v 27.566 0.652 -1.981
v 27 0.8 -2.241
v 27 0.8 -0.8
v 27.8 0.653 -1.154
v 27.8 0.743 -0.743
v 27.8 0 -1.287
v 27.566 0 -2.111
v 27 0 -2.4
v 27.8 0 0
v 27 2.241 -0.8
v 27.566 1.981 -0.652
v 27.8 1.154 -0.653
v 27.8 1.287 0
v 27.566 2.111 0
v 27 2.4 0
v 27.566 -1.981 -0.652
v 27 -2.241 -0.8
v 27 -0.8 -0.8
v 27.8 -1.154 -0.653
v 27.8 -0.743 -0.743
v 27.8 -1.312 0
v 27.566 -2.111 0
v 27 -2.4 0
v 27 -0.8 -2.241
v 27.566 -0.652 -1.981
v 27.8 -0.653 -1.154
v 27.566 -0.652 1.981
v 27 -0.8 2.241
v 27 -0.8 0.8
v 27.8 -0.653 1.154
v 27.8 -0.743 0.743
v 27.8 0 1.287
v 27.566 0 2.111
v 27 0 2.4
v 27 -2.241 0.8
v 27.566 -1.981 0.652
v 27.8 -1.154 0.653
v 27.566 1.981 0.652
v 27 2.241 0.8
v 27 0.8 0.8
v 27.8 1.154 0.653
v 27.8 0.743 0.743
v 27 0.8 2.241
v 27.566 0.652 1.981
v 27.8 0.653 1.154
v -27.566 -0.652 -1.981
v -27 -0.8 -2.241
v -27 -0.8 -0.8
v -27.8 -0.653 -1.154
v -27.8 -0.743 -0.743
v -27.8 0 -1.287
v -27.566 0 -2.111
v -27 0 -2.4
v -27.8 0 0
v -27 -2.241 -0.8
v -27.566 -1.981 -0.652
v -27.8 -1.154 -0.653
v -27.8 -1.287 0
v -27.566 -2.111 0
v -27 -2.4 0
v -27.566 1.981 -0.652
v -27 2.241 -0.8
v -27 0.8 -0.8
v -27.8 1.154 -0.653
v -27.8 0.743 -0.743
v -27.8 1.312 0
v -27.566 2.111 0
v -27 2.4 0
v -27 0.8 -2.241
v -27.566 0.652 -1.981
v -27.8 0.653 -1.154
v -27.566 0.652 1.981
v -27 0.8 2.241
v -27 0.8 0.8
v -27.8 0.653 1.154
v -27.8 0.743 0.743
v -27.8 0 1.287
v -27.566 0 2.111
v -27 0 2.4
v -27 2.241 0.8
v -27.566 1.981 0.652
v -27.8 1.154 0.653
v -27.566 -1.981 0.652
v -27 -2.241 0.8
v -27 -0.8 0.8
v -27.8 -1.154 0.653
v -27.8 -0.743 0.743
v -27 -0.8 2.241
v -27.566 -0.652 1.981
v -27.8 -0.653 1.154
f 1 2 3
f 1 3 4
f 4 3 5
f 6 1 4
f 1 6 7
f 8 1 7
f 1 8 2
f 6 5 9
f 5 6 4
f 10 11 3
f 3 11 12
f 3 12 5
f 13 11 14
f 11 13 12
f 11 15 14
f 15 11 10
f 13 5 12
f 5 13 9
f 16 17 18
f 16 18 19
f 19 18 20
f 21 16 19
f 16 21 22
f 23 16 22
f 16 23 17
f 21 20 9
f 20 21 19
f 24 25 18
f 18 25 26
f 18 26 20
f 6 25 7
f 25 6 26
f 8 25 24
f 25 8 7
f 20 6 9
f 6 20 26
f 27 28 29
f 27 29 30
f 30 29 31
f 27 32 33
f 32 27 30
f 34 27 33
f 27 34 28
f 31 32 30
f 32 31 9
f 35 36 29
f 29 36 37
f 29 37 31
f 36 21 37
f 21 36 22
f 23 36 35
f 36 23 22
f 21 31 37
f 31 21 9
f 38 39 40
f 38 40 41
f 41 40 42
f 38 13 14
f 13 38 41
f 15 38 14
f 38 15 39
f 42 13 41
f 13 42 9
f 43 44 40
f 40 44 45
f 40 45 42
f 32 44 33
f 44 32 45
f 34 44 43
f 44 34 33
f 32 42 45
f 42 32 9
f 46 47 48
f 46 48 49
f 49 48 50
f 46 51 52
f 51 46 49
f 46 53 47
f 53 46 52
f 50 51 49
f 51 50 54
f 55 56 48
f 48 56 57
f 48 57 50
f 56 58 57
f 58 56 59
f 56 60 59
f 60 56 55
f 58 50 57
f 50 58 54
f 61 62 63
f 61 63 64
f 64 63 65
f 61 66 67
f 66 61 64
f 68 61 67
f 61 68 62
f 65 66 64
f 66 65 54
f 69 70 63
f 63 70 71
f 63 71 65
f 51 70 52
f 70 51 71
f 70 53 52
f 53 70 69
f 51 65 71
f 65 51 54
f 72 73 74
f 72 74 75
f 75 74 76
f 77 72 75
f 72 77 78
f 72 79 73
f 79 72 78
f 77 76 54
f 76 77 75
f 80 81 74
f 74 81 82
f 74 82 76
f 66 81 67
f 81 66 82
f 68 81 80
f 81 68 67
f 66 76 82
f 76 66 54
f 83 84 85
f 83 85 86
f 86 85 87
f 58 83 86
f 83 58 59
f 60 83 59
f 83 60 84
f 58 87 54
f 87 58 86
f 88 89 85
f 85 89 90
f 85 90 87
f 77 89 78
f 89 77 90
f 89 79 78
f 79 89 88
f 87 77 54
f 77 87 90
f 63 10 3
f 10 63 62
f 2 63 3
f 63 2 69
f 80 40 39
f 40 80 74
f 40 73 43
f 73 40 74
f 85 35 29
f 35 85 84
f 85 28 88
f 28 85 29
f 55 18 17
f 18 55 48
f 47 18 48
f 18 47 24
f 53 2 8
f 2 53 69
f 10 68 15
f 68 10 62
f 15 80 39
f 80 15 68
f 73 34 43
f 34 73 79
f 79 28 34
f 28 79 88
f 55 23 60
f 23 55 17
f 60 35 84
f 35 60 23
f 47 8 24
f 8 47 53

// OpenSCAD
// file: ../p/box2-9p.scad
use <../lib.scad>
function ldraw_lib__box2_9p() = [
// 0 Box with  2 Faces with  3 Parallel Edges
// 0 Name: box2-9p.dat
// 0 Author: Willy Tschager [Holly-Wood]
// 0 !LDRAW_ORG Primitive UPDATE 2024-01
// 0 !LICENSE Licensed under CC BY 4.0 : see CAreadme.txt
// 
// 0 BFC CERTIFY CCW
  [0,"BFC","CERTIFY"],
  [0,"BFC","CCW"],
// 
// 0 !HISTORY 2013-12-23 [PTadmin] Official Update 2013-02
// 0 !HISTORY 2024-01-04 [Holly-Wood] Complete re-write, original by Duq
// 0 !HISTORY 2024-01-29 [OrionP] Official Update 2024-01
// 
// 2 24 -1 1 1 1 1 1
  [2,24,-1,1,1,1,1,1],
// 2 24 -1 1 -1 1 1 -1
  [2,24,-1,1,-1,1,1,-1],
// 4 16 -1 1 1 1 1 1 1 1 -1 -1 1 -1
  [4,16,-1,1,1,1,1,1,1,1,-1,-1,1,-1],
// 
// 2 24 -1 -1 1 1 -1 1
  [2,24,-1,-1,1,1,-1,1],
// 4 16 1 -1 1 1 1 1 -1 1 1 -1 -1 1
  [4,16,1,-1,1,1,1,1,-1,1,1,-1,-1,1],
];
module ldraw_lib__box2_9p(step=0, col=false, unit=2/5, alt=false, line=0.2, solid=!$preview)
    makepoly(ldraw_lib__box2_9p(), step=step, col=col, unit=unit, alt=alt, line=line, solid=solid);
ldraw_lib__box2_9p(line=0.2);
// file: ../p/axlehol8.scad
use <../lib.scad>
use <box2-9p.scad>
function ldraw_lib__axlehol8() = [
// 0 Technic Axle Perimeter
// 0 Name: axlehol8.dat
// 0 Author: Steve Bliss [sbliss]
// 0 !LDRAW_ORG Primitive UPDATE 2024-01
// 0 !LICENSE Licensed under CC BY 4.0 : see CAreadme.txt
// 
// 0 BFC CERTIFY CCW
  [0,"BFC","CERTIFY"],
  [0,"BFC","CCW"],
// 
// 0 !HISTORY 2000-05-07 [PTadmin] Official Update 2000-01
// 0 !HISTORY 2002-11-08 [OrionP] Adjusted fit and precision
// 0 !HISTORY 2003-03-12 [PTadmin] Official Update 2003-01
// 0 !HISTORY 2007-06-24 [PTadmin] Header formatted for Contributor Agreement
// 0 !HISTORY 2008-07-01 [PTadmin] Official Update 2008-01
// 0 !HISTORY 2021-03-25 [Sirio] Rounded to four decimals and added primitives
// 0 !HISTORY 2022-03-06 [PTadmin] Official Update 2022-02
// 0 !HISTORY 2024-01-24 [MagFors] Update description, to be only used on axles, not holes
// 0 !HISTORY 2024-01-29 [OrionP] Official Update 2024-01
// 
// 0 // Primitives
// 0 BFC INVERTNEXT
  [0,"BFC","INVERTNEXT"],
// 1 16 3.80115 .5 3.80115 0 -1.80115 0 .5 0 0 0 0 -1.80115 box2-9p.dat
  [1,16,3.80115,.5,3.80115,0,-1.80115,0,.5,0,0,0,0,-1.80115, ldraw_lib__box2_9p()],
// 0 BFC INVERTNEXT
  [0,"BFC","INVERTNEXT"],
// 1 16 -3.80115 .5 3.80115 0 1.80115 0 .5 0 0 0 0 -1.80115 box2-9p.dat
  [1,16,-3.80115,.5,3.80115,0,1.80115,0,.5,0,0,0,0,-1.80115, ldraw_lib__box2_9p()],
// 0 BFC INVERTNEXT
  [0,"BFC","INVERTNEXT"],
// 1 16 -3.80115 .5 -3.80115 0 1.80115 0 .5 0 0 0 0 1.80115 box2-9p.dat
  [1,16,-3.80115,.5,-3.80115,0,1.80115,0,.5,0,0,0,0,1.80115, ldraw_lib__box2_9p()],
// 0 BFC INVERTNEXT
  [0,"BFC","INVERTNEXT"],
// 1 16 3.80115 .5 -3.80115 0 -1.80115 0 .5 0 0 0 0 1.80115 box2-9p.dat
  [1,16,3.80115,.5,-3.80115,0,-1.80115,0,.5,0,0,0,0,1.80115, ldraw_lib__box2_9p()],
// 0 // Faces
// 4 16 5.6023 1 2 5.6023 0 2 6 0 0 6 1 0
  [4,16,5.6023,1,2,5.6023,0,2,6,0,0,6,1,0],
// 4 16 2 1 5.6023 0 1 6 0 0 6 2 0 5.6023
  [4,16,2,1,5.6023,0,1,6,0,0,6,2,0,5.6023],
// 4 16 -2 1 5.6023 -2 0 5.6023 0 0 6 0 1 6
  [4,16,-2,1,5.6023,-2,0,5.6023,0,0,6,0,1,6],
// 4 16 -5.6023 1 2 -6 1 0 -6 0 0 -5.6023 0 2
  [4,16,-5.6023,1,2,-6,1,0,-6,0,0,-5.6023,0,2],
// 4 16 -5.6023 1 -2 -5.6023 0 -2 -6 0 0 -6 1 0
  [4,16,-5.6023,1,-2,-5.6023,0,-2,-6,0,0,-6,1,0],
// 4 16 2 1 -5.6023 2 0 -5.6023 0 0 -6 0 1 -6
  [4,16,2,1,-5.6023,2,0,-5.6023,0,0,-6,0,1,-6],
// 4 16 -2 1 -5.6023 0 1 -6 0 0 -6 -2 0 -5.6023
  [4,16,-2,1,-5.6023,0,1,-6,0,0,-6,-2,0,-5.6023],
// 4 16 5.6023 1 -2 6 1 0 6 0 0 5.6023 0 -2
  [4,16,5.6023,1,-2,6,1,0,6,0,0,5.6023,0,-2],
// 0 // Conditional lines
// 5 24 0 0 6 0 1 6 -2 0 5.6023 2 0 5.6023
  [5,24,0,0,6,0,1,6,-2,0,5.6023,2,0,5.6023],
// 5 24 -6 0 0 -6 1 0 -5.6023 0 -2 -5.6023 0 2
  [5,24,-6,0,0,-6,1,0,-5.6023,0,-2,-5.6023,0,2],
// 5 24 0 0 -6 0 1 -6 -2 0 -5.6023 2 0 -5.6023
  [5,24,0,0,-6,0,1,-6,-2,0,-5.6023,2,0,-5.6023],
// 5 24 6 0 0 6 1 0 5.6023 0 2 5.6023 0 -2
  [5,24,6,0,0,6,1,0,5.6023,0,2,5.6023,0,-2],
];
module ldraw_lib__axlehol8(step=0, col=false, unit=2/5, alt=false, line=0.2, solid=!$preview)
    makepoly(ldraw_lib__axlehol8(), step=step, col=col, unit=unit, alt=alt, line=line, solid=solid);
ldraw_lib__axlehol8(line=0.2);
// main file
use <../lib.scad>
use <../p/axleend2.scad>
use <../p/axlehol8.scad>
function ldraw_lib__44294() = [
// 0 Technic Axle  7
// 0 Name: 44294.dat
// 0 Author: Magnus Forsberg [MagFors]
// 0 !LDRAW_ORG Part UPDATE 2025-09
// 0 !LICENSE Licensed under CC BY 4.0 : see CAreadme.txt
// 
// 0 BFC CERTIFY CCW
  [0,"BFC","CERTIFY"],
  [0,"BFC","CCW"],
// 
// 0 !HISTORY 2005-12-28 [PTadmin] Official Update 2005-01
// 0 !HISTORY 2007-07-04 [PTadmin] Header formatted for Contributor Agreement
// 0 !HISTORY 2008-07-01 [PTadmin] Official Update 2008-01
// 0 !HISTORY 2025-09-01 [MagFors] Beveled axle ends
// 0 !HISTORY 2025-09-01 [MagFors] Complete rework, original by Dan Boger
// 0 !HISTORY 2025-09-29 [OrionP] Official Update 2025-09
// 
// 1 16 70 0 0 0 -1 0 1 0 0 0 0 1 axleend2.dat
  [1,16,70,0,0,0,-1,0,1,0,0,0,0,1, ldraw_lib__axleend2()],
// 1 16 -70 0 0 0 1 0 1 0 0 0 0 -1 axleend2.dat
  [1,16,-70,0,0,0,1,0,1,0,0,0,0,-1, ldraw_lib__axleend2()],
// 1 16 67.5 0 0 0 -135 0 1 0 0 0 0 1 axlehol8.dat
  [1,16,67.5,0,0,0,-135,0,1,0,0,0,0,1, ldraw_lib__axlehol8()],
];
module ldraw_lib__44294(step=0, col=false, unit=2/5, alt=false, line=0.2, solid=!$preview)
    makepoly(ldraw_lib__44294(), step=step, col=col, unit=unit, alt=alt, line=line, solid=solid);
ldraw_lib__44294(line=0.2);
